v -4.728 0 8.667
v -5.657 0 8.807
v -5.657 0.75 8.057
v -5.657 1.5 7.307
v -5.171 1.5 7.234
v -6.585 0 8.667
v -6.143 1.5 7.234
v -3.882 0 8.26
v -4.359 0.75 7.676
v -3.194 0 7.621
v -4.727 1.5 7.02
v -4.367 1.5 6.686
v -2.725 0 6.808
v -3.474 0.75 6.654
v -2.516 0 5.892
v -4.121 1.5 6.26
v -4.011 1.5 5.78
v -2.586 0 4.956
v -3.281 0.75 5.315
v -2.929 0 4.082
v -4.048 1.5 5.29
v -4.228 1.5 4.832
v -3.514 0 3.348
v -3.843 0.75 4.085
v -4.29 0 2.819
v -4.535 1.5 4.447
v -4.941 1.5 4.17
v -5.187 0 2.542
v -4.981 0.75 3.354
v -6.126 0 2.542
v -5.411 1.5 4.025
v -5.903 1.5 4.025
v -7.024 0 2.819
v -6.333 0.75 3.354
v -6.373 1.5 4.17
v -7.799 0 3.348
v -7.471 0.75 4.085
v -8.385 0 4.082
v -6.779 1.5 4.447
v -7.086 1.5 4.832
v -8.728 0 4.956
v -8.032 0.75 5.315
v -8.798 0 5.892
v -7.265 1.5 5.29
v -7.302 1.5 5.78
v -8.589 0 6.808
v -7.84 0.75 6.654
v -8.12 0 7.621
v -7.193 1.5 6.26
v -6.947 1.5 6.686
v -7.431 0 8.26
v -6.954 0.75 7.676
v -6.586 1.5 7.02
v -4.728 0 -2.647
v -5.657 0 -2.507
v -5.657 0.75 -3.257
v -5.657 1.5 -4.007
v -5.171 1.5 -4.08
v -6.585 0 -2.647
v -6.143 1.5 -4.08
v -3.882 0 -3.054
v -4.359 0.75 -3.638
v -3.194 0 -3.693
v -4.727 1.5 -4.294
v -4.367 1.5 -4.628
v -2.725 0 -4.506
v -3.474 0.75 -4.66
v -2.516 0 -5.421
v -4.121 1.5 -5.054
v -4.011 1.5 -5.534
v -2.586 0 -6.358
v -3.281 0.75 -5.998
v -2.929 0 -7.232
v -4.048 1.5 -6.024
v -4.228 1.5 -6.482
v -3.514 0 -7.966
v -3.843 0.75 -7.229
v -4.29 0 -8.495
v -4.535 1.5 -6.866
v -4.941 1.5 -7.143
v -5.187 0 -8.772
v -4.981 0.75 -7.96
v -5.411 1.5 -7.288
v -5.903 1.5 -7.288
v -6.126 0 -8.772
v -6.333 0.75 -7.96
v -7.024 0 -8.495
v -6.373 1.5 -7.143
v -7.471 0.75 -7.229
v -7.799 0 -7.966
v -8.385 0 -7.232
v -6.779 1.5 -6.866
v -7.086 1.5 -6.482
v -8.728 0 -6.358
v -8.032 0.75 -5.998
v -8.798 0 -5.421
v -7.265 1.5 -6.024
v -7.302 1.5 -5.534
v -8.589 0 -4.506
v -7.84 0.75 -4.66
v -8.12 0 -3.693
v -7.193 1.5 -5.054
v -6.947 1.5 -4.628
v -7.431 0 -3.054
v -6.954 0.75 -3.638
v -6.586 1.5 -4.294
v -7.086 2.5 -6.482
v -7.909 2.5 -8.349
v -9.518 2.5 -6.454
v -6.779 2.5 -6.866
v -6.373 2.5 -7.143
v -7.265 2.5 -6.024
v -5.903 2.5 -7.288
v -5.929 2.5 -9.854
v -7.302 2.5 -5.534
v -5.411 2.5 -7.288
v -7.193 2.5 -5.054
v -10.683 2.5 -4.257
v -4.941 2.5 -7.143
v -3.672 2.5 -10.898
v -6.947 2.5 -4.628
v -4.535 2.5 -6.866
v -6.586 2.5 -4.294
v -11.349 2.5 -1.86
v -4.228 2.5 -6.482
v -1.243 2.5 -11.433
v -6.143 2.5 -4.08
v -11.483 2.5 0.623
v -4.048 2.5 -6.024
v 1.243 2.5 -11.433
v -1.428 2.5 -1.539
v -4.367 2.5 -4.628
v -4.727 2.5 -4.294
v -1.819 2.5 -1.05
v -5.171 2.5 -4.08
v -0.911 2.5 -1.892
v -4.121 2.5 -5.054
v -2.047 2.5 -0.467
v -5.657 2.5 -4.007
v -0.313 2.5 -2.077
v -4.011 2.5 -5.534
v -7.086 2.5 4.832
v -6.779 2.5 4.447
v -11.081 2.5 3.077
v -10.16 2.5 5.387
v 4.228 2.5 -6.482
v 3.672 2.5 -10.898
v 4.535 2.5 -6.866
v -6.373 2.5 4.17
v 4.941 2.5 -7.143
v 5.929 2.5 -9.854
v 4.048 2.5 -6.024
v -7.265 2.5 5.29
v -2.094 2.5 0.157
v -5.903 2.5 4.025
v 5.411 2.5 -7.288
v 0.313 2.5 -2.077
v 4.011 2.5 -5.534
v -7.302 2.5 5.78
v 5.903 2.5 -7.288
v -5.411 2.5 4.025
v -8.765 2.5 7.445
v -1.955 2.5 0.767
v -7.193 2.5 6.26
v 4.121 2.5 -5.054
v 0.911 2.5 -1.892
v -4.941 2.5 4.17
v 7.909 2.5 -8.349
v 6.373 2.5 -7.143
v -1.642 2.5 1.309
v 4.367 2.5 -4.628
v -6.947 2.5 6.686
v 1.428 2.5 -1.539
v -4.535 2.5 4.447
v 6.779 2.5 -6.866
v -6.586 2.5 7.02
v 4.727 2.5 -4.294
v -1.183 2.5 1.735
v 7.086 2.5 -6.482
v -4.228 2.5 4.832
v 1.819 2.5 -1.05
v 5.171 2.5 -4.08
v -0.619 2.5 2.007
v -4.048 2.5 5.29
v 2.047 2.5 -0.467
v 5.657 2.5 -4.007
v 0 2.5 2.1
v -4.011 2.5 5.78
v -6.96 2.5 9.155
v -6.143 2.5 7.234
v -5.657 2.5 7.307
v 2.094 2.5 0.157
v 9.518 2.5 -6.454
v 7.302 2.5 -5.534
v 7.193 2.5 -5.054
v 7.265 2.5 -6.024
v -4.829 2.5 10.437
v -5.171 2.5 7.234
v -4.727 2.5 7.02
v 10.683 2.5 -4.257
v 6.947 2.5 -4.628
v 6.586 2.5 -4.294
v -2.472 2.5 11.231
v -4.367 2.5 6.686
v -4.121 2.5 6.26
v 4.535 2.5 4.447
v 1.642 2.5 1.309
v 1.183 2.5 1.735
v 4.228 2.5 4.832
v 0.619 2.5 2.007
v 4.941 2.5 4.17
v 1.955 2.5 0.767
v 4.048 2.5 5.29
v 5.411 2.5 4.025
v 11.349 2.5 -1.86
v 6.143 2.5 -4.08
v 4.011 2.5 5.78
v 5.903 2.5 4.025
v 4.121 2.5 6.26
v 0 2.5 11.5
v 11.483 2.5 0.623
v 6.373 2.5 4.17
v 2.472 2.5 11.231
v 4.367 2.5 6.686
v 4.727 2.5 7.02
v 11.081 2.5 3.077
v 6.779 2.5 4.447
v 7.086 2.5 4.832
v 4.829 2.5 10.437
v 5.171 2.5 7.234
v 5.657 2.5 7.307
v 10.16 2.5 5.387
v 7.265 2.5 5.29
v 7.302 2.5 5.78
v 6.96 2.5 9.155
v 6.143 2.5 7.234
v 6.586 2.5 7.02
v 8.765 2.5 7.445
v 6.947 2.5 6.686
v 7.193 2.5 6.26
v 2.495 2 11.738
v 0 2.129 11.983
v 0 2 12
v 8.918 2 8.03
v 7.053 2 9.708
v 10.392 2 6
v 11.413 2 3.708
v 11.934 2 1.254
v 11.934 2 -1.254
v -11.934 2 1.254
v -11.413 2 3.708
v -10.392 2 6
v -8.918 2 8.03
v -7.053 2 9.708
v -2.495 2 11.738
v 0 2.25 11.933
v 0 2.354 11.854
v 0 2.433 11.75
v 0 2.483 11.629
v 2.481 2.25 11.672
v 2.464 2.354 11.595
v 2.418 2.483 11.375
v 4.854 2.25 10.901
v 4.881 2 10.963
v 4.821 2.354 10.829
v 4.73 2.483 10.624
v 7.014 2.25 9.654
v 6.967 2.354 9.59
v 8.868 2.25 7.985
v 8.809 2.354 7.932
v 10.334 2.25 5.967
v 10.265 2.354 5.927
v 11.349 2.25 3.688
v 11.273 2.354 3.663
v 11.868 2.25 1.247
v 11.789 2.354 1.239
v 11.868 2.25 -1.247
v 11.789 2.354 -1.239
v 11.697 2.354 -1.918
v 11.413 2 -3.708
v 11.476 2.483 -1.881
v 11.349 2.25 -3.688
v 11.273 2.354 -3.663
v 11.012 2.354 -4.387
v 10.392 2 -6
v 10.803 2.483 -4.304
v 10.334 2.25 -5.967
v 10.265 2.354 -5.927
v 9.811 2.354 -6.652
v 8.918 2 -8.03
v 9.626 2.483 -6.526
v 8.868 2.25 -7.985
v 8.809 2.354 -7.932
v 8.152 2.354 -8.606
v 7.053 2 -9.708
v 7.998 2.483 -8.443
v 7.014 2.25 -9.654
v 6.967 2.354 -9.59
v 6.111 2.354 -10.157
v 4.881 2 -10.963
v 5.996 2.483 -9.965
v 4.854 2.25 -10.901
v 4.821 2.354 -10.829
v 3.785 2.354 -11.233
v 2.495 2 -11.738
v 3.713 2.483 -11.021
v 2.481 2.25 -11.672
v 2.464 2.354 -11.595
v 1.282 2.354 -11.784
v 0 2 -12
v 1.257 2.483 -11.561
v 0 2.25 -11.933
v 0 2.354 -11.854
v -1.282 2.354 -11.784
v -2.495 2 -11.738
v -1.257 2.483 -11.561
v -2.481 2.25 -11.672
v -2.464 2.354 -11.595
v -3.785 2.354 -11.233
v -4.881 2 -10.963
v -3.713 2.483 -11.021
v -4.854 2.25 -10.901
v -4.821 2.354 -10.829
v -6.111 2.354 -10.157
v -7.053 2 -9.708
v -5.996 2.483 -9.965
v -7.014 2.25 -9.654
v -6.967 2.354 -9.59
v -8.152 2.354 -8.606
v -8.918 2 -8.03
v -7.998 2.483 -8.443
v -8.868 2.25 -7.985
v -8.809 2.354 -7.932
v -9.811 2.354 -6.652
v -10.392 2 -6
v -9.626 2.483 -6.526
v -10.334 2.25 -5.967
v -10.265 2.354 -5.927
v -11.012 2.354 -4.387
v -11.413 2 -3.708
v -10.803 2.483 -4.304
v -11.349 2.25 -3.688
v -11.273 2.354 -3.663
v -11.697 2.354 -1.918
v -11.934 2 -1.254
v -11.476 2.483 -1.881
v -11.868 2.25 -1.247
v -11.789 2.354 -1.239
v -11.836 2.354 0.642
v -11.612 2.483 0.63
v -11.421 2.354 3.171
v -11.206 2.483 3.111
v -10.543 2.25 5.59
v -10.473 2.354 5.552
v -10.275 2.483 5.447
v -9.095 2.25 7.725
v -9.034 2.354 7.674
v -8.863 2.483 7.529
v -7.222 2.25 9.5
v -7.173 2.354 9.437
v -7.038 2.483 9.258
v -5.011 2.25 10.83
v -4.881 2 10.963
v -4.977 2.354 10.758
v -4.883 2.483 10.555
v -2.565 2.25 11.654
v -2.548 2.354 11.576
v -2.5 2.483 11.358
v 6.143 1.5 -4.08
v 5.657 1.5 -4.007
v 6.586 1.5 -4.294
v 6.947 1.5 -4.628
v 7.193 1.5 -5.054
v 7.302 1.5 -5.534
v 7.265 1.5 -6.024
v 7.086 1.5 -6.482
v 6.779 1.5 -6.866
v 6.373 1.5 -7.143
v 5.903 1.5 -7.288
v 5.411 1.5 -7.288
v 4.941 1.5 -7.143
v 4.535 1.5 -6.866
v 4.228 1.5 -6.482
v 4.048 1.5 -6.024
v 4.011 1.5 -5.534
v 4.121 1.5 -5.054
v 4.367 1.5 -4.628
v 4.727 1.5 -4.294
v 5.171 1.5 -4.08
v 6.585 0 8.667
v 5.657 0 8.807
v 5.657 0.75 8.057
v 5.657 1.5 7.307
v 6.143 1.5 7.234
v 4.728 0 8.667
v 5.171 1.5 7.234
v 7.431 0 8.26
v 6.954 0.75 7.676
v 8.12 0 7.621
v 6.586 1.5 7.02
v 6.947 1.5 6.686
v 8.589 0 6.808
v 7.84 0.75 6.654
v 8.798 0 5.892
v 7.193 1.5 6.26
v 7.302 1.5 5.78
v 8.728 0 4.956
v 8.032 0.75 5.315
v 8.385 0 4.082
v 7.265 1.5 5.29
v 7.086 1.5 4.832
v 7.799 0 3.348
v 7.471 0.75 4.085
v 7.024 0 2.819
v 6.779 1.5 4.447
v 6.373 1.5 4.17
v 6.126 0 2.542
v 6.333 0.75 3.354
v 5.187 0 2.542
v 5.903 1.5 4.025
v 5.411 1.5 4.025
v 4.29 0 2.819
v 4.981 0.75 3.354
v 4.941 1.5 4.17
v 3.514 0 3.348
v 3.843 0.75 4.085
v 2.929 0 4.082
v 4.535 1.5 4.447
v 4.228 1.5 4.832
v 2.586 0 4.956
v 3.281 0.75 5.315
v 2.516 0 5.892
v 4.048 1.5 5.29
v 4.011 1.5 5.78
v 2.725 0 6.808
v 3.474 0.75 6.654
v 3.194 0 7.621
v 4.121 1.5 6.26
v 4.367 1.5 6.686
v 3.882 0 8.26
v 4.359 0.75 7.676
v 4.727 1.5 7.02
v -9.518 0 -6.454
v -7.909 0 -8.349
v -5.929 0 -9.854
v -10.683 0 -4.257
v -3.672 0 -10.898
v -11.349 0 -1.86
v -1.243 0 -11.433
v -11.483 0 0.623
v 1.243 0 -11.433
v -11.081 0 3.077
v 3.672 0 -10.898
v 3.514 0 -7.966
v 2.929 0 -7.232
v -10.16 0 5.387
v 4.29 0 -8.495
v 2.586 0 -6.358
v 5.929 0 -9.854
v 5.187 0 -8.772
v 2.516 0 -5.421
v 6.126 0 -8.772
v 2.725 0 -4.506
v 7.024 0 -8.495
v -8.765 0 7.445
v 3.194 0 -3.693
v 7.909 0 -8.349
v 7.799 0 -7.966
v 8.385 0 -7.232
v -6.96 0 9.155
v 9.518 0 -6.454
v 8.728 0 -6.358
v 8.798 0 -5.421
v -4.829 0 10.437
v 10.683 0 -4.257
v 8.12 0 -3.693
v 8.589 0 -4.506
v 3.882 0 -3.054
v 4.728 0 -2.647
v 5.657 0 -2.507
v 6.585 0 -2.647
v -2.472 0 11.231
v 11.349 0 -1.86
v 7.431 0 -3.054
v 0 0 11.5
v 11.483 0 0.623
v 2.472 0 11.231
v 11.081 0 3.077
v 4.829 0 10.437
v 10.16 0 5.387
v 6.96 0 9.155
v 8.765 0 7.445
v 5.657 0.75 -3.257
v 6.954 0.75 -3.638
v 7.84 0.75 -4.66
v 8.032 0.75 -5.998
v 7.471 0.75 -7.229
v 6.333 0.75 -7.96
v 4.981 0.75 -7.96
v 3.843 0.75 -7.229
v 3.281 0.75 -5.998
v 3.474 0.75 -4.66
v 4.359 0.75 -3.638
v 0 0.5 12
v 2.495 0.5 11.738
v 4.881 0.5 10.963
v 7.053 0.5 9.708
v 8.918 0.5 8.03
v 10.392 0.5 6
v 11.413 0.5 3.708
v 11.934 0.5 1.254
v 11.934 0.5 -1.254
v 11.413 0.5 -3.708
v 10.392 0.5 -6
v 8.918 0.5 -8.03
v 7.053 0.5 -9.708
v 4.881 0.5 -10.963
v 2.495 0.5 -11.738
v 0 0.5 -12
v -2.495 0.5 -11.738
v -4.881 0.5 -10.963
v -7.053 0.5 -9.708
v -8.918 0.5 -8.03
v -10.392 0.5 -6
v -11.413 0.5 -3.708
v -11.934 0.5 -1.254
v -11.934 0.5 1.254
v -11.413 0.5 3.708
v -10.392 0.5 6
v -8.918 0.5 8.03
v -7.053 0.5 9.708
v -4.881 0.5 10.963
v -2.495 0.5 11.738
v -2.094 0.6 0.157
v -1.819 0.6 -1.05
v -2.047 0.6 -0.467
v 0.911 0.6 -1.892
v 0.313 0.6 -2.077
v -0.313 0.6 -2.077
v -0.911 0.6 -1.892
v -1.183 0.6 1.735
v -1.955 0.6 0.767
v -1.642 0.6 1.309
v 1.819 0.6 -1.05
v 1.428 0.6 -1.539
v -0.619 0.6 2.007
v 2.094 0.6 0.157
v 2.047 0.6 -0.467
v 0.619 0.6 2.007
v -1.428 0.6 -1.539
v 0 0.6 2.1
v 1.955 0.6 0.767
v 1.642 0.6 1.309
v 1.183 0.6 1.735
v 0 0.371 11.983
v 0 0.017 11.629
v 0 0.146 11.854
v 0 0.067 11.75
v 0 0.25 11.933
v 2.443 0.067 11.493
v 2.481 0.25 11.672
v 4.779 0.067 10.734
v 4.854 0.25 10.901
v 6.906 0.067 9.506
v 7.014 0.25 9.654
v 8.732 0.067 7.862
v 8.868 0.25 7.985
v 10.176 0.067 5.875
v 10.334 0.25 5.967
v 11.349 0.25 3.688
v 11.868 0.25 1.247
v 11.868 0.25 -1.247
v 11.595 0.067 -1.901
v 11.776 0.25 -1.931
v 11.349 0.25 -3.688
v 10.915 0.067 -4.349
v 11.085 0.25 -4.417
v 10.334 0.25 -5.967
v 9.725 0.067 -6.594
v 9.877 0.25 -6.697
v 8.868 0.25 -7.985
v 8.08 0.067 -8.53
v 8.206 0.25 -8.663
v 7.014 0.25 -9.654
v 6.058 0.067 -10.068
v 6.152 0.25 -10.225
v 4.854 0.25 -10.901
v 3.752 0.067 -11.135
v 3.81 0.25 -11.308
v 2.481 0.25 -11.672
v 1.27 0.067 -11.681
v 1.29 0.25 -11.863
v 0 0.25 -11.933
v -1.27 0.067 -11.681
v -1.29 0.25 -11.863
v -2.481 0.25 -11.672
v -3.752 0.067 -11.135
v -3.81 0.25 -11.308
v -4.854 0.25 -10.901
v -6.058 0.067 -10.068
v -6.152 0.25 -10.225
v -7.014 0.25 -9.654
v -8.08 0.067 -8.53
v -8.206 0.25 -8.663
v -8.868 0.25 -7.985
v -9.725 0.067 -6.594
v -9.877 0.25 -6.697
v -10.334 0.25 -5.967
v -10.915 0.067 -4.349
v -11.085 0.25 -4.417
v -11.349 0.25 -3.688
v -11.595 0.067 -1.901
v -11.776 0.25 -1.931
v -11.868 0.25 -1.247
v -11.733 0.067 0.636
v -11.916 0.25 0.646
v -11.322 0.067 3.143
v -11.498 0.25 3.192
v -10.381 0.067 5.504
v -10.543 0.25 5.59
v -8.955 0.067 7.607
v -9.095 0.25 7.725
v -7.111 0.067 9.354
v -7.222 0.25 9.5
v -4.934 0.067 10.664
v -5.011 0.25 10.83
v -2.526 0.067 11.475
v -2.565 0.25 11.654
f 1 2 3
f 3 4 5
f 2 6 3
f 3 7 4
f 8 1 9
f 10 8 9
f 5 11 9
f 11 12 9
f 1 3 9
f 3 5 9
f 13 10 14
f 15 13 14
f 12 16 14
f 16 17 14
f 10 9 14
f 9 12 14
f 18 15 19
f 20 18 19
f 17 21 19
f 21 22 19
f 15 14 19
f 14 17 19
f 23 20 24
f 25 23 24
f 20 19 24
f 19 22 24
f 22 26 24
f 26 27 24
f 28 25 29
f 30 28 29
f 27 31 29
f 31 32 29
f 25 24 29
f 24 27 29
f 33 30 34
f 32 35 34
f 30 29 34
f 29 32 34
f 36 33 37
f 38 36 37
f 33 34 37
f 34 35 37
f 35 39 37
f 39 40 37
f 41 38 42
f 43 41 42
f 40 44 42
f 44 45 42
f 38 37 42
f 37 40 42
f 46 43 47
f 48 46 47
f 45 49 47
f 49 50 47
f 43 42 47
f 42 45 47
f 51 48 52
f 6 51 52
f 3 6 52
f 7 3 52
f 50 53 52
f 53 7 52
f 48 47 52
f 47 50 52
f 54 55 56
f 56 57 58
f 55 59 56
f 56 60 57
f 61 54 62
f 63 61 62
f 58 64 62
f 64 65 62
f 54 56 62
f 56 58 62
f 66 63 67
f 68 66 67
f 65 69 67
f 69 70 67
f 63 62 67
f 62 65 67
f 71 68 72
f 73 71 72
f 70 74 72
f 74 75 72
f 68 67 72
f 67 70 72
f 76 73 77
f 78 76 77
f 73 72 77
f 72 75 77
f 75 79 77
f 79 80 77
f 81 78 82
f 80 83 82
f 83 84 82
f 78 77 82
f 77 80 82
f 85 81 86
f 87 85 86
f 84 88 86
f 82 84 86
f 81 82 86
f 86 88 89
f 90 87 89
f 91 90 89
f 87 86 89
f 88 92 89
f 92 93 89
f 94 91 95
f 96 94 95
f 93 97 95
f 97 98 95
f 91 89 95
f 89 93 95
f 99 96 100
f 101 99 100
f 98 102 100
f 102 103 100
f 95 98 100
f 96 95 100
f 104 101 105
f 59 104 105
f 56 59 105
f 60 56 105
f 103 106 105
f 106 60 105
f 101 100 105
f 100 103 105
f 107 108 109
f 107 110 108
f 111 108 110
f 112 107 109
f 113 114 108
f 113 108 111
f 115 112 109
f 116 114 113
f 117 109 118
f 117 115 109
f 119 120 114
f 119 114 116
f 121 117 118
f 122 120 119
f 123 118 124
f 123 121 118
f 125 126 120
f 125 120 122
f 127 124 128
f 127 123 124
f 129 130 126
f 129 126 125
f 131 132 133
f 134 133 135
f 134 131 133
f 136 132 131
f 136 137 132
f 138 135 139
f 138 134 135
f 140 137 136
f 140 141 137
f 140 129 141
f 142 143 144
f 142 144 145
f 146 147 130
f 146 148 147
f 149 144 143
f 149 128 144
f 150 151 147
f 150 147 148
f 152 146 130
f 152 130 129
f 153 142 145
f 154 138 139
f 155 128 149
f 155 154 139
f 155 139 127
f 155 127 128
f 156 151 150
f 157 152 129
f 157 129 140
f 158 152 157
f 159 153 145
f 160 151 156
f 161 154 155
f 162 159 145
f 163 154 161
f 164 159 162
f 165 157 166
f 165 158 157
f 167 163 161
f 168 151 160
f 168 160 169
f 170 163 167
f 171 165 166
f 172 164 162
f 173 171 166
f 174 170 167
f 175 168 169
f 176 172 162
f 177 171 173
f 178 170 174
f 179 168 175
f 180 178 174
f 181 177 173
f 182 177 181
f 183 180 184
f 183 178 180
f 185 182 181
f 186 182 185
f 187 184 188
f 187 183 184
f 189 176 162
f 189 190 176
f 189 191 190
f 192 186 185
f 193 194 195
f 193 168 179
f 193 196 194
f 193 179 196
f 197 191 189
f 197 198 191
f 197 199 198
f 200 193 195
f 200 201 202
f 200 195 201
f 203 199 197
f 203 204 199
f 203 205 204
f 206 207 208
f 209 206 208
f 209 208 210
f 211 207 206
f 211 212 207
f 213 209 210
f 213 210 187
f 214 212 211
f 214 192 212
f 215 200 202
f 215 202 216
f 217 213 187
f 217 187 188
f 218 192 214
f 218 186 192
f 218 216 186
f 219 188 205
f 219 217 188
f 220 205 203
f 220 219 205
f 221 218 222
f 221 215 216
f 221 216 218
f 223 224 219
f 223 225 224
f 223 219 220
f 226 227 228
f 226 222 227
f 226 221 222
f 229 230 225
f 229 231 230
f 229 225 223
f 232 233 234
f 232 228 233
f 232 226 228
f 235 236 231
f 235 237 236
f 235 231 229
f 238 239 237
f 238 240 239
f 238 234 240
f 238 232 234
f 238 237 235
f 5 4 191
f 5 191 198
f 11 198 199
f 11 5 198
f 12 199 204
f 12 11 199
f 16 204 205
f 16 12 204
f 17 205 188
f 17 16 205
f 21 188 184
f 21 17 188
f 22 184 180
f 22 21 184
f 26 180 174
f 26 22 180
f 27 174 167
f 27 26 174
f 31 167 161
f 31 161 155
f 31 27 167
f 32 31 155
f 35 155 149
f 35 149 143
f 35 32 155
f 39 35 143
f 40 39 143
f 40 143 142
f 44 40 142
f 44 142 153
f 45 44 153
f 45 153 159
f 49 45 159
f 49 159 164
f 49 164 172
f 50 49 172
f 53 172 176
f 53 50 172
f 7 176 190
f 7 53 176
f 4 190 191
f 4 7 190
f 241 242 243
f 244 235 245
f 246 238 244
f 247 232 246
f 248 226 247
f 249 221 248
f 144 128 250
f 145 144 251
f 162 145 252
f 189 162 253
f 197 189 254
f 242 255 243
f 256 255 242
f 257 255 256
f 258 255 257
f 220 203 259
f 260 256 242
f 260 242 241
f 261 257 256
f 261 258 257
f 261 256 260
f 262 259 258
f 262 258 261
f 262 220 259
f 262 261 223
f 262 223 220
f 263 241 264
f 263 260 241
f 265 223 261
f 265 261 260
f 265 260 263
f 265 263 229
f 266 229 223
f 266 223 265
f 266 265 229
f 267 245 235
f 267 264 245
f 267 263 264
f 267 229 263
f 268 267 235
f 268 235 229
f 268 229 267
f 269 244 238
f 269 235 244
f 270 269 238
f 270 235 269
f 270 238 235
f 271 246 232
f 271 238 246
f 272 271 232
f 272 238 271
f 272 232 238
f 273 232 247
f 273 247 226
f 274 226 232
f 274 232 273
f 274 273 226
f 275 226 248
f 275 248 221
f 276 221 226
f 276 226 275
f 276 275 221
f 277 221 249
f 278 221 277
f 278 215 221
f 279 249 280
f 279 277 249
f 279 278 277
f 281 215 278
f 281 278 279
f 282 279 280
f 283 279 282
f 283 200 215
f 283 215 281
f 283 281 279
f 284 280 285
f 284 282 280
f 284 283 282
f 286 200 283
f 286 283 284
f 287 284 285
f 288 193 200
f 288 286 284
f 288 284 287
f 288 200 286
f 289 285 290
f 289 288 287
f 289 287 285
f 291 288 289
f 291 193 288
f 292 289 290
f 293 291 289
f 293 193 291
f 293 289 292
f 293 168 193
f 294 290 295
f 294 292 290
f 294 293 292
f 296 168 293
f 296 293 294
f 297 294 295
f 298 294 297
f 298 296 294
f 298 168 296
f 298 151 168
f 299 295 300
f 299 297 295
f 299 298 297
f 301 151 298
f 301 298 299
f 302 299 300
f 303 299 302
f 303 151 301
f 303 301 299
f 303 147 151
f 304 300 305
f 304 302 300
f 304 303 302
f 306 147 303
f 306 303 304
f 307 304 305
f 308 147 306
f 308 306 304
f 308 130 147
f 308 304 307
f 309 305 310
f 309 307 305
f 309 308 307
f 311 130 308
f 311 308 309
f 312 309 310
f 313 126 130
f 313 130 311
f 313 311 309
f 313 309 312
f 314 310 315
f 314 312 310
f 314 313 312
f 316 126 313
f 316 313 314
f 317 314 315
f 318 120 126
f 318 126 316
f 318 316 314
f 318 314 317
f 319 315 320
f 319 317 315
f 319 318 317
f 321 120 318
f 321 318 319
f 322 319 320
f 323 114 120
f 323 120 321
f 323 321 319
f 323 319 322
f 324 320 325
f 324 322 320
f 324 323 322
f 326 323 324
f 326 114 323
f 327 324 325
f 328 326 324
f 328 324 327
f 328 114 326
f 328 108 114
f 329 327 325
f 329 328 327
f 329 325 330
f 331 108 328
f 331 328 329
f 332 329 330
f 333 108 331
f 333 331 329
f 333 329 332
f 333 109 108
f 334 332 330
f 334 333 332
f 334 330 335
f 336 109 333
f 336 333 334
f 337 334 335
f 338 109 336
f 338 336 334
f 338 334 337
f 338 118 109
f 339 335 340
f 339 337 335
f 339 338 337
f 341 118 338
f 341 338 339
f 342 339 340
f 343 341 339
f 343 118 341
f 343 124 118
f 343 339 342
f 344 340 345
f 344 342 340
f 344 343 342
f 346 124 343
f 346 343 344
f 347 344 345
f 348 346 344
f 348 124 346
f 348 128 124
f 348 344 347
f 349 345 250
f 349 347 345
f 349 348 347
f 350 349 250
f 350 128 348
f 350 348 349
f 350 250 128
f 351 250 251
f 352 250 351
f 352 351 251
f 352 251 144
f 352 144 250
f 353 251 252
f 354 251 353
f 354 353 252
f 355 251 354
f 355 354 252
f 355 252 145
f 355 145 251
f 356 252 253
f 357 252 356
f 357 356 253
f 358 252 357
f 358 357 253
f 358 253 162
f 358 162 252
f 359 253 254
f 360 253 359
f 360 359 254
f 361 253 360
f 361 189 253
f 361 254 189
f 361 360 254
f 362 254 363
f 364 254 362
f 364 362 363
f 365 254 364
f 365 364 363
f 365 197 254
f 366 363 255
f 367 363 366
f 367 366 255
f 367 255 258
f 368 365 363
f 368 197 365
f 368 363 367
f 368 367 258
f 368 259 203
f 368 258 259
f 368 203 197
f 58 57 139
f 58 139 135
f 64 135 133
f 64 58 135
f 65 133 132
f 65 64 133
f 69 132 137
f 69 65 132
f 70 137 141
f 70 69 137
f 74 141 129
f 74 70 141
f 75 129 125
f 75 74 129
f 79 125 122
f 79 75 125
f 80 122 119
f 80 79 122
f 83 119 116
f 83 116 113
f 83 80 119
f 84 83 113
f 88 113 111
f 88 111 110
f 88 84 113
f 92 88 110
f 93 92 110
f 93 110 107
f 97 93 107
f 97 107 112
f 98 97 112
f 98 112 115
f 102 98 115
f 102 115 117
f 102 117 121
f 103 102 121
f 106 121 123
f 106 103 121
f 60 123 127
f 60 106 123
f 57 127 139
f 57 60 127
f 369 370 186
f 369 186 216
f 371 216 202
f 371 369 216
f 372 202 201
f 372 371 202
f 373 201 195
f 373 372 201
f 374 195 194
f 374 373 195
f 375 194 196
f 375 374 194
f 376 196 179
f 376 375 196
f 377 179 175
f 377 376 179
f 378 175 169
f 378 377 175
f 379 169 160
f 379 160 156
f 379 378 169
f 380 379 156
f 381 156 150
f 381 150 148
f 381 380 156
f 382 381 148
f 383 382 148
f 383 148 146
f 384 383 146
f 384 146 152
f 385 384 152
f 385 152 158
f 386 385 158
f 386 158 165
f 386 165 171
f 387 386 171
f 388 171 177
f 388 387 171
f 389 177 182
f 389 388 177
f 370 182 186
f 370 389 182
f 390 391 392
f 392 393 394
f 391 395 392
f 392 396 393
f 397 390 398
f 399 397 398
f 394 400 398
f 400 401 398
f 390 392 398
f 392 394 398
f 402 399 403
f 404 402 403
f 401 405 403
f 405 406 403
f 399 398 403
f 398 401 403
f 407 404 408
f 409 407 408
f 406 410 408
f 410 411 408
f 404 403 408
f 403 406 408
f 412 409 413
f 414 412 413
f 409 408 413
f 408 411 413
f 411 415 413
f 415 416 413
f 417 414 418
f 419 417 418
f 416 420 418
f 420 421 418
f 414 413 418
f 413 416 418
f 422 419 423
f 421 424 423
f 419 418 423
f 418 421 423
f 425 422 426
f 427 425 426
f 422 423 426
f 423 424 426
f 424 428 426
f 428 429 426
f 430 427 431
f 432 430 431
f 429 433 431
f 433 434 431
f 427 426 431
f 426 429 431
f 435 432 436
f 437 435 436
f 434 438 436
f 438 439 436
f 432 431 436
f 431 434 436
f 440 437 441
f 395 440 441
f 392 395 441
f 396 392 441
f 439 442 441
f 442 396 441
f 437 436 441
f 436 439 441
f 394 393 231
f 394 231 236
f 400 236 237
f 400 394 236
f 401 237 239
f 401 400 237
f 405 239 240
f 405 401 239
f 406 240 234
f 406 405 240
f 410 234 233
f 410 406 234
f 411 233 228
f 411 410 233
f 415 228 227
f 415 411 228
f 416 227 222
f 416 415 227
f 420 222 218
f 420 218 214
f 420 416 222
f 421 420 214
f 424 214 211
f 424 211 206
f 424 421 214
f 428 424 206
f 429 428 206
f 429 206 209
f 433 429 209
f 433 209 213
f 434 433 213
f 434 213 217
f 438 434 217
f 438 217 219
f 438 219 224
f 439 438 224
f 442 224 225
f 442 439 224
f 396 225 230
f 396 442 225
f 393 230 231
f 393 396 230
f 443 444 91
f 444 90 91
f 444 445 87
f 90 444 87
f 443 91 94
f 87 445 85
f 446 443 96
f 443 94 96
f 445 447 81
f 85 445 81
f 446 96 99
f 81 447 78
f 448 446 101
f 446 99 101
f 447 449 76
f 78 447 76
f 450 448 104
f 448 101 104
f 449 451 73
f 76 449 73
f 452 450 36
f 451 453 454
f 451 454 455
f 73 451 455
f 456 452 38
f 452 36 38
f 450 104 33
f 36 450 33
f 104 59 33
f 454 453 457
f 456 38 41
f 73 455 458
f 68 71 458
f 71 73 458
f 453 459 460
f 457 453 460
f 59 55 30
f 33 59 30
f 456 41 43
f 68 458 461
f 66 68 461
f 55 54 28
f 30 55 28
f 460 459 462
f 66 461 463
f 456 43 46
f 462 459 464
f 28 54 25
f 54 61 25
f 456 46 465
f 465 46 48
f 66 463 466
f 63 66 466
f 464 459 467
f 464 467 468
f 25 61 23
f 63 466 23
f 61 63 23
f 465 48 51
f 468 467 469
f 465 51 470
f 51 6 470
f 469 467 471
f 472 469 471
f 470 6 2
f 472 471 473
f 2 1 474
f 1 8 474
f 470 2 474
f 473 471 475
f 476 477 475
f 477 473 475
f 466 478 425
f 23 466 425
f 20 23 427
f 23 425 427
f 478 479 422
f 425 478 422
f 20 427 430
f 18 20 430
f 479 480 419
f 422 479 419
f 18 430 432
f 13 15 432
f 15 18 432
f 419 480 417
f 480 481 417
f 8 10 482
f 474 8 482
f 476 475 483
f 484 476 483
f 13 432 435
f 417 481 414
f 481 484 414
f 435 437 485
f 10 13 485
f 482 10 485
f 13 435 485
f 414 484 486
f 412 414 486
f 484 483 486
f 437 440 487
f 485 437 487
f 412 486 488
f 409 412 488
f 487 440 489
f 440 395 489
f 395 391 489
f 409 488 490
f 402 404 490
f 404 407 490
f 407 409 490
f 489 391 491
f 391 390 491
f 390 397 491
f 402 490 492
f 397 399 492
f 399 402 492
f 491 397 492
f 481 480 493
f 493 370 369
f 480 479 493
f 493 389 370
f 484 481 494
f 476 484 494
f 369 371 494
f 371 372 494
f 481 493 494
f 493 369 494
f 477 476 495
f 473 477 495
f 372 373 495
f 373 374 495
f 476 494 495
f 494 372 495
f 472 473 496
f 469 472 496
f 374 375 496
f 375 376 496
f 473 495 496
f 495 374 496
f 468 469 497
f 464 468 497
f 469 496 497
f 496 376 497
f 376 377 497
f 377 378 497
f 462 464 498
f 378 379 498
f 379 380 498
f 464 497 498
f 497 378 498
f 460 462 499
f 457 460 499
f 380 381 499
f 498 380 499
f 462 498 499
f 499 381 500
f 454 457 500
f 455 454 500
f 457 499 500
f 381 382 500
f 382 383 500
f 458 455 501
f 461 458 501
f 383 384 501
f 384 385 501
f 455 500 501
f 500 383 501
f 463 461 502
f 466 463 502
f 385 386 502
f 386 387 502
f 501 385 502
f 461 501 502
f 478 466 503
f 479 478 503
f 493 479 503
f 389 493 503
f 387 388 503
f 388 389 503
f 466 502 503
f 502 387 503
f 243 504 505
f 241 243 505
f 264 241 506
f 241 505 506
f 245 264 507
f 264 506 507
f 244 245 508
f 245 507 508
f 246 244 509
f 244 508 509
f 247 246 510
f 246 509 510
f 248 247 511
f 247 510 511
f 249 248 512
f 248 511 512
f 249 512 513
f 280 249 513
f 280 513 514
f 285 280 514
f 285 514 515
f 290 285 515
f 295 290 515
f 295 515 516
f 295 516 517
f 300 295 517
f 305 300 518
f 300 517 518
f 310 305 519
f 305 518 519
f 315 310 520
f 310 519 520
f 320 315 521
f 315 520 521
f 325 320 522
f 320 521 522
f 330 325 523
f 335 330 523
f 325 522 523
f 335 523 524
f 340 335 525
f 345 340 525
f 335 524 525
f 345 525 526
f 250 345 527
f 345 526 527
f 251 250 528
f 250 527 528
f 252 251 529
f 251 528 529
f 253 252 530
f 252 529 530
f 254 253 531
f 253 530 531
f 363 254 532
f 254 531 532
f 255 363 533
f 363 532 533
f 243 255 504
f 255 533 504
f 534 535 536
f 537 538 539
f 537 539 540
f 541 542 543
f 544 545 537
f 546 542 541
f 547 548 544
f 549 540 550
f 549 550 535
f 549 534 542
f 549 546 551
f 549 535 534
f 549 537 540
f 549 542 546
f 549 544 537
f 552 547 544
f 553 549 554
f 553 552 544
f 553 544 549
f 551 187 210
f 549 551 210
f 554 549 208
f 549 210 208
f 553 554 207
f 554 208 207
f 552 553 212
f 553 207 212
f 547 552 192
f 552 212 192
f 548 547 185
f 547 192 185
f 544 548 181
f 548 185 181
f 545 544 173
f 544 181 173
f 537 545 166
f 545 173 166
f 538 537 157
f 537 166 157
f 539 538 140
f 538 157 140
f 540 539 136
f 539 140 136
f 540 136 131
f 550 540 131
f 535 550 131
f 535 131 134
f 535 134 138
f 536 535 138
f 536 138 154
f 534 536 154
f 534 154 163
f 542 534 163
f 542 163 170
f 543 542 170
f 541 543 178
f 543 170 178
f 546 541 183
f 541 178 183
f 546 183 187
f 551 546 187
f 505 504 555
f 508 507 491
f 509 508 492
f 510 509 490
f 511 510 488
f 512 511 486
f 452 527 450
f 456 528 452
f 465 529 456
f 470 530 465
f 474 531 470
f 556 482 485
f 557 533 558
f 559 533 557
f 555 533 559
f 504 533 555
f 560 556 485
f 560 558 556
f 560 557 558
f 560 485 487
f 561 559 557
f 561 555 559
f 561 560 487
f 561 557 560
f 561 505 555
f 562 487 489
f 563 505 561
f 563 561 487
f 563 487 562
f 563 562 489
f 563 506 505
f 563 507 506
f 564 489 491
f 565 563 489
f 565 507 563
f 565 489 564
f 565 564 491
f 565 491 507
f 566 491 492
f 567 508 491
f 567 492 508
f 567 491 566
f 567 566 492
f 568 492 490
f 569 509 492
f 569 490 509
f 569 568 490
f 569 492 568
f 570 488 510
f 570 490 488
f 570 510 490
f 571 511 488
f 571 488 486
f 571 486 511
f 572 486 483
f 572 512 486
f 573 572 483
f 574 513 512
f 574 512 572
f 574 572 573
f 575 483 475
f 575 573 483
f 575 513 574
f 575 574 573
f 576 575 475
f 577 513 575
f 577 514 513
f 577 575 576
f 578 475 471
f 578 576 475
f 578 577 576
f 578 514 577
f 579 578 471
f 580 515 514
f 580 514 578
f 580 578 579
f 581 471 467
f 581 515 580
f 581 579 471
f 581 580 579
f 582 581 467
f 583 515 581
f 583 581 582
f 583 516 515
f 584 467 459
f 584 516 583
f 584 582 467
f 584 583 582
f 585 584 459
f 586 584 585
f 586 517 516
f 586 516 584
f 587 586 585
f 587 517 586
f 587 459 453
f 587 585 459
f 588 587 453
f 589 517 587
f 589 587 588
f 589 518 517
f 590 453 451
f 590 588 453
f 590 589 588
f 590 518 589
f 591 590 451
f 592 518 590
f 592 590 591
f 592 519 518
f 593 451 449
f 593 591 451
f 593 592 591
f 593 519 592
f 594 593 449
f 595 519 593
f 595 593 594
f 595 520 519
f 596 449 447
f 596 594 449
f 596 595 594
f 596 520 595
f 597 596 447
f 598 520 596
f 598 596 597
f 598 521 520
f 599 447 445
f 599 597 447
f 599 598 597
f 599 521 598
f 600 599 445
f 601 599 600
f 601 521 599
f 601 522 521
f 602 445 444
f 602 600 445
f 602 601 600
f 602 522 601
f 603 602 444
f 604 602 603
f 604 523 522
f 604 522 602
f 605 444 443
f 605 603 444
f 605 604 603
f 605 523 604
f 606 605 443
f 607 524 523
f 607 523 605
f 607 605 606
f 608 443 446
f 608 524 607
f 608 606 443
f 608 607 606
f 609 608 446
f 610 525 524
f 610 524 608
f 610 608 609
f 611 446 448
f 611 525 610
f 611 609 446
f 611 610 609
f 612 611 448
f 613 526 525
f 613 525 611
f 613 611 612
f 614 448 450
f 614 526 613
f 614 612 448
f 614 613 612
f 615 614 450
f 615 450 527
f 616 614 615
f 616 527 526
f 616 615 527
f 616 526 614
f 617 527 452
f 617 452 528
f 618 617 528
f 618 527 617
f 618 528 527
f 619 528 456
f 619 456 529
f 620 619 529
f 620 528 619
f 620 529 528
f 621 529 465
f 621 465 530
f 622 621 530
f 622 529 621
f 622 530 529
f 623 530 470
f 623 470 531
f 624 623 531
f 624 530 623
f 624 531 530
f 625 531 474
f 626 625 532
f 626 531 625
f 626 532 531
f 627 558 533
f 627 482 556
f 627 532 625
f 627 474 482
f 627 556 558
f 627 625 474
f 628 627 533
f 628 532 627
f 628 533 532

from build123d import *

# Parameters (mm, degrees)
SKETCH1_R           = 12
SKETCH1_R_2         = 1.65
BOSS_EXTRUDE1_DEPTH = 2.5
SKETCH2_R           = 2.1
CUT_EXTRUDE1_DEPTH  = 1.9
CHAMFER1_SIZE       = 1.5
FILLET1_R           = 0.5


with BuildPart() as part:
    # Sketch1 → Boss-Extrude1 (new body)
    with BuildSketch(Plane(origin=(0, 0, 0), x_dir=(1, 0, 0), z_dir=(0, 1, 0))):
        with Locations(Location((0, 0, 0), (0, 0, 270))):
            Circle(SKETCH1_R)
        with Locations(Location((-5.656854249, 5.656854249, 0), (0, 0, 270))):
            Circle(SKETCH1_R_2, mode=Mode.SUBTRACT)
        with Locations(Location((5.656854249, 5.656854249, 0), (0, 0, 270))):
            Circle(SKETCH1_R_2, mode=Mode.SUBTRACT)
        with Locations(Location((5.656854249, -5.656854249, 0), (0, 0, 270))):
            Circle(SKETCH1_R_2, mode=Mode.SUBTRACT)
        with Locations(Location((-5.656854249, -5.656854249, 0), (0, 0, 270))):
            Circle(SKETCH1_R_2, mode=Mode.SUBTRACT)
    extrude(amount=BOSS_EXTRUDE1_DEPTH)

    # Sketch2 → Cut-Extrude1 (cut)
    with BuildSketch(Plane(origin=(0, 2.5, 0), x_dir=(1, 0, 0), z_dir=(0, 1, 0))):
        with Locations(Location((0, 0, 0), (0, 0, 270))):
            Circle(SKETCH2_R)
    extrude(amount=-CUT_EXTRUDE1_DEPTH, mode=Mode.SUBTRACT)

    # Chamfer1
    chamfer1_edges = [part.edges().sort_by_distance(p)[0] for p in [
        (5.656854249, 0, 4.006854249),
        (-5.656854249, 0, 4.006854249),
        (-5.656854249, 0, -7.306854249),
        (5.656854249, 0, -7.306854249),
    ]]
    chamfer(chamfer1_edges, length=CHAMFER1_SIZE)

    # Fillet1
    fillet1_edges = [part.edges().sort_by_distance(p)[0] for p in [
        (0, 0, -12),
        (0, 2.5, -12),
    ]]
    fillet(fillet1_edges, radius=FILLET1_R)


solid = part.part
